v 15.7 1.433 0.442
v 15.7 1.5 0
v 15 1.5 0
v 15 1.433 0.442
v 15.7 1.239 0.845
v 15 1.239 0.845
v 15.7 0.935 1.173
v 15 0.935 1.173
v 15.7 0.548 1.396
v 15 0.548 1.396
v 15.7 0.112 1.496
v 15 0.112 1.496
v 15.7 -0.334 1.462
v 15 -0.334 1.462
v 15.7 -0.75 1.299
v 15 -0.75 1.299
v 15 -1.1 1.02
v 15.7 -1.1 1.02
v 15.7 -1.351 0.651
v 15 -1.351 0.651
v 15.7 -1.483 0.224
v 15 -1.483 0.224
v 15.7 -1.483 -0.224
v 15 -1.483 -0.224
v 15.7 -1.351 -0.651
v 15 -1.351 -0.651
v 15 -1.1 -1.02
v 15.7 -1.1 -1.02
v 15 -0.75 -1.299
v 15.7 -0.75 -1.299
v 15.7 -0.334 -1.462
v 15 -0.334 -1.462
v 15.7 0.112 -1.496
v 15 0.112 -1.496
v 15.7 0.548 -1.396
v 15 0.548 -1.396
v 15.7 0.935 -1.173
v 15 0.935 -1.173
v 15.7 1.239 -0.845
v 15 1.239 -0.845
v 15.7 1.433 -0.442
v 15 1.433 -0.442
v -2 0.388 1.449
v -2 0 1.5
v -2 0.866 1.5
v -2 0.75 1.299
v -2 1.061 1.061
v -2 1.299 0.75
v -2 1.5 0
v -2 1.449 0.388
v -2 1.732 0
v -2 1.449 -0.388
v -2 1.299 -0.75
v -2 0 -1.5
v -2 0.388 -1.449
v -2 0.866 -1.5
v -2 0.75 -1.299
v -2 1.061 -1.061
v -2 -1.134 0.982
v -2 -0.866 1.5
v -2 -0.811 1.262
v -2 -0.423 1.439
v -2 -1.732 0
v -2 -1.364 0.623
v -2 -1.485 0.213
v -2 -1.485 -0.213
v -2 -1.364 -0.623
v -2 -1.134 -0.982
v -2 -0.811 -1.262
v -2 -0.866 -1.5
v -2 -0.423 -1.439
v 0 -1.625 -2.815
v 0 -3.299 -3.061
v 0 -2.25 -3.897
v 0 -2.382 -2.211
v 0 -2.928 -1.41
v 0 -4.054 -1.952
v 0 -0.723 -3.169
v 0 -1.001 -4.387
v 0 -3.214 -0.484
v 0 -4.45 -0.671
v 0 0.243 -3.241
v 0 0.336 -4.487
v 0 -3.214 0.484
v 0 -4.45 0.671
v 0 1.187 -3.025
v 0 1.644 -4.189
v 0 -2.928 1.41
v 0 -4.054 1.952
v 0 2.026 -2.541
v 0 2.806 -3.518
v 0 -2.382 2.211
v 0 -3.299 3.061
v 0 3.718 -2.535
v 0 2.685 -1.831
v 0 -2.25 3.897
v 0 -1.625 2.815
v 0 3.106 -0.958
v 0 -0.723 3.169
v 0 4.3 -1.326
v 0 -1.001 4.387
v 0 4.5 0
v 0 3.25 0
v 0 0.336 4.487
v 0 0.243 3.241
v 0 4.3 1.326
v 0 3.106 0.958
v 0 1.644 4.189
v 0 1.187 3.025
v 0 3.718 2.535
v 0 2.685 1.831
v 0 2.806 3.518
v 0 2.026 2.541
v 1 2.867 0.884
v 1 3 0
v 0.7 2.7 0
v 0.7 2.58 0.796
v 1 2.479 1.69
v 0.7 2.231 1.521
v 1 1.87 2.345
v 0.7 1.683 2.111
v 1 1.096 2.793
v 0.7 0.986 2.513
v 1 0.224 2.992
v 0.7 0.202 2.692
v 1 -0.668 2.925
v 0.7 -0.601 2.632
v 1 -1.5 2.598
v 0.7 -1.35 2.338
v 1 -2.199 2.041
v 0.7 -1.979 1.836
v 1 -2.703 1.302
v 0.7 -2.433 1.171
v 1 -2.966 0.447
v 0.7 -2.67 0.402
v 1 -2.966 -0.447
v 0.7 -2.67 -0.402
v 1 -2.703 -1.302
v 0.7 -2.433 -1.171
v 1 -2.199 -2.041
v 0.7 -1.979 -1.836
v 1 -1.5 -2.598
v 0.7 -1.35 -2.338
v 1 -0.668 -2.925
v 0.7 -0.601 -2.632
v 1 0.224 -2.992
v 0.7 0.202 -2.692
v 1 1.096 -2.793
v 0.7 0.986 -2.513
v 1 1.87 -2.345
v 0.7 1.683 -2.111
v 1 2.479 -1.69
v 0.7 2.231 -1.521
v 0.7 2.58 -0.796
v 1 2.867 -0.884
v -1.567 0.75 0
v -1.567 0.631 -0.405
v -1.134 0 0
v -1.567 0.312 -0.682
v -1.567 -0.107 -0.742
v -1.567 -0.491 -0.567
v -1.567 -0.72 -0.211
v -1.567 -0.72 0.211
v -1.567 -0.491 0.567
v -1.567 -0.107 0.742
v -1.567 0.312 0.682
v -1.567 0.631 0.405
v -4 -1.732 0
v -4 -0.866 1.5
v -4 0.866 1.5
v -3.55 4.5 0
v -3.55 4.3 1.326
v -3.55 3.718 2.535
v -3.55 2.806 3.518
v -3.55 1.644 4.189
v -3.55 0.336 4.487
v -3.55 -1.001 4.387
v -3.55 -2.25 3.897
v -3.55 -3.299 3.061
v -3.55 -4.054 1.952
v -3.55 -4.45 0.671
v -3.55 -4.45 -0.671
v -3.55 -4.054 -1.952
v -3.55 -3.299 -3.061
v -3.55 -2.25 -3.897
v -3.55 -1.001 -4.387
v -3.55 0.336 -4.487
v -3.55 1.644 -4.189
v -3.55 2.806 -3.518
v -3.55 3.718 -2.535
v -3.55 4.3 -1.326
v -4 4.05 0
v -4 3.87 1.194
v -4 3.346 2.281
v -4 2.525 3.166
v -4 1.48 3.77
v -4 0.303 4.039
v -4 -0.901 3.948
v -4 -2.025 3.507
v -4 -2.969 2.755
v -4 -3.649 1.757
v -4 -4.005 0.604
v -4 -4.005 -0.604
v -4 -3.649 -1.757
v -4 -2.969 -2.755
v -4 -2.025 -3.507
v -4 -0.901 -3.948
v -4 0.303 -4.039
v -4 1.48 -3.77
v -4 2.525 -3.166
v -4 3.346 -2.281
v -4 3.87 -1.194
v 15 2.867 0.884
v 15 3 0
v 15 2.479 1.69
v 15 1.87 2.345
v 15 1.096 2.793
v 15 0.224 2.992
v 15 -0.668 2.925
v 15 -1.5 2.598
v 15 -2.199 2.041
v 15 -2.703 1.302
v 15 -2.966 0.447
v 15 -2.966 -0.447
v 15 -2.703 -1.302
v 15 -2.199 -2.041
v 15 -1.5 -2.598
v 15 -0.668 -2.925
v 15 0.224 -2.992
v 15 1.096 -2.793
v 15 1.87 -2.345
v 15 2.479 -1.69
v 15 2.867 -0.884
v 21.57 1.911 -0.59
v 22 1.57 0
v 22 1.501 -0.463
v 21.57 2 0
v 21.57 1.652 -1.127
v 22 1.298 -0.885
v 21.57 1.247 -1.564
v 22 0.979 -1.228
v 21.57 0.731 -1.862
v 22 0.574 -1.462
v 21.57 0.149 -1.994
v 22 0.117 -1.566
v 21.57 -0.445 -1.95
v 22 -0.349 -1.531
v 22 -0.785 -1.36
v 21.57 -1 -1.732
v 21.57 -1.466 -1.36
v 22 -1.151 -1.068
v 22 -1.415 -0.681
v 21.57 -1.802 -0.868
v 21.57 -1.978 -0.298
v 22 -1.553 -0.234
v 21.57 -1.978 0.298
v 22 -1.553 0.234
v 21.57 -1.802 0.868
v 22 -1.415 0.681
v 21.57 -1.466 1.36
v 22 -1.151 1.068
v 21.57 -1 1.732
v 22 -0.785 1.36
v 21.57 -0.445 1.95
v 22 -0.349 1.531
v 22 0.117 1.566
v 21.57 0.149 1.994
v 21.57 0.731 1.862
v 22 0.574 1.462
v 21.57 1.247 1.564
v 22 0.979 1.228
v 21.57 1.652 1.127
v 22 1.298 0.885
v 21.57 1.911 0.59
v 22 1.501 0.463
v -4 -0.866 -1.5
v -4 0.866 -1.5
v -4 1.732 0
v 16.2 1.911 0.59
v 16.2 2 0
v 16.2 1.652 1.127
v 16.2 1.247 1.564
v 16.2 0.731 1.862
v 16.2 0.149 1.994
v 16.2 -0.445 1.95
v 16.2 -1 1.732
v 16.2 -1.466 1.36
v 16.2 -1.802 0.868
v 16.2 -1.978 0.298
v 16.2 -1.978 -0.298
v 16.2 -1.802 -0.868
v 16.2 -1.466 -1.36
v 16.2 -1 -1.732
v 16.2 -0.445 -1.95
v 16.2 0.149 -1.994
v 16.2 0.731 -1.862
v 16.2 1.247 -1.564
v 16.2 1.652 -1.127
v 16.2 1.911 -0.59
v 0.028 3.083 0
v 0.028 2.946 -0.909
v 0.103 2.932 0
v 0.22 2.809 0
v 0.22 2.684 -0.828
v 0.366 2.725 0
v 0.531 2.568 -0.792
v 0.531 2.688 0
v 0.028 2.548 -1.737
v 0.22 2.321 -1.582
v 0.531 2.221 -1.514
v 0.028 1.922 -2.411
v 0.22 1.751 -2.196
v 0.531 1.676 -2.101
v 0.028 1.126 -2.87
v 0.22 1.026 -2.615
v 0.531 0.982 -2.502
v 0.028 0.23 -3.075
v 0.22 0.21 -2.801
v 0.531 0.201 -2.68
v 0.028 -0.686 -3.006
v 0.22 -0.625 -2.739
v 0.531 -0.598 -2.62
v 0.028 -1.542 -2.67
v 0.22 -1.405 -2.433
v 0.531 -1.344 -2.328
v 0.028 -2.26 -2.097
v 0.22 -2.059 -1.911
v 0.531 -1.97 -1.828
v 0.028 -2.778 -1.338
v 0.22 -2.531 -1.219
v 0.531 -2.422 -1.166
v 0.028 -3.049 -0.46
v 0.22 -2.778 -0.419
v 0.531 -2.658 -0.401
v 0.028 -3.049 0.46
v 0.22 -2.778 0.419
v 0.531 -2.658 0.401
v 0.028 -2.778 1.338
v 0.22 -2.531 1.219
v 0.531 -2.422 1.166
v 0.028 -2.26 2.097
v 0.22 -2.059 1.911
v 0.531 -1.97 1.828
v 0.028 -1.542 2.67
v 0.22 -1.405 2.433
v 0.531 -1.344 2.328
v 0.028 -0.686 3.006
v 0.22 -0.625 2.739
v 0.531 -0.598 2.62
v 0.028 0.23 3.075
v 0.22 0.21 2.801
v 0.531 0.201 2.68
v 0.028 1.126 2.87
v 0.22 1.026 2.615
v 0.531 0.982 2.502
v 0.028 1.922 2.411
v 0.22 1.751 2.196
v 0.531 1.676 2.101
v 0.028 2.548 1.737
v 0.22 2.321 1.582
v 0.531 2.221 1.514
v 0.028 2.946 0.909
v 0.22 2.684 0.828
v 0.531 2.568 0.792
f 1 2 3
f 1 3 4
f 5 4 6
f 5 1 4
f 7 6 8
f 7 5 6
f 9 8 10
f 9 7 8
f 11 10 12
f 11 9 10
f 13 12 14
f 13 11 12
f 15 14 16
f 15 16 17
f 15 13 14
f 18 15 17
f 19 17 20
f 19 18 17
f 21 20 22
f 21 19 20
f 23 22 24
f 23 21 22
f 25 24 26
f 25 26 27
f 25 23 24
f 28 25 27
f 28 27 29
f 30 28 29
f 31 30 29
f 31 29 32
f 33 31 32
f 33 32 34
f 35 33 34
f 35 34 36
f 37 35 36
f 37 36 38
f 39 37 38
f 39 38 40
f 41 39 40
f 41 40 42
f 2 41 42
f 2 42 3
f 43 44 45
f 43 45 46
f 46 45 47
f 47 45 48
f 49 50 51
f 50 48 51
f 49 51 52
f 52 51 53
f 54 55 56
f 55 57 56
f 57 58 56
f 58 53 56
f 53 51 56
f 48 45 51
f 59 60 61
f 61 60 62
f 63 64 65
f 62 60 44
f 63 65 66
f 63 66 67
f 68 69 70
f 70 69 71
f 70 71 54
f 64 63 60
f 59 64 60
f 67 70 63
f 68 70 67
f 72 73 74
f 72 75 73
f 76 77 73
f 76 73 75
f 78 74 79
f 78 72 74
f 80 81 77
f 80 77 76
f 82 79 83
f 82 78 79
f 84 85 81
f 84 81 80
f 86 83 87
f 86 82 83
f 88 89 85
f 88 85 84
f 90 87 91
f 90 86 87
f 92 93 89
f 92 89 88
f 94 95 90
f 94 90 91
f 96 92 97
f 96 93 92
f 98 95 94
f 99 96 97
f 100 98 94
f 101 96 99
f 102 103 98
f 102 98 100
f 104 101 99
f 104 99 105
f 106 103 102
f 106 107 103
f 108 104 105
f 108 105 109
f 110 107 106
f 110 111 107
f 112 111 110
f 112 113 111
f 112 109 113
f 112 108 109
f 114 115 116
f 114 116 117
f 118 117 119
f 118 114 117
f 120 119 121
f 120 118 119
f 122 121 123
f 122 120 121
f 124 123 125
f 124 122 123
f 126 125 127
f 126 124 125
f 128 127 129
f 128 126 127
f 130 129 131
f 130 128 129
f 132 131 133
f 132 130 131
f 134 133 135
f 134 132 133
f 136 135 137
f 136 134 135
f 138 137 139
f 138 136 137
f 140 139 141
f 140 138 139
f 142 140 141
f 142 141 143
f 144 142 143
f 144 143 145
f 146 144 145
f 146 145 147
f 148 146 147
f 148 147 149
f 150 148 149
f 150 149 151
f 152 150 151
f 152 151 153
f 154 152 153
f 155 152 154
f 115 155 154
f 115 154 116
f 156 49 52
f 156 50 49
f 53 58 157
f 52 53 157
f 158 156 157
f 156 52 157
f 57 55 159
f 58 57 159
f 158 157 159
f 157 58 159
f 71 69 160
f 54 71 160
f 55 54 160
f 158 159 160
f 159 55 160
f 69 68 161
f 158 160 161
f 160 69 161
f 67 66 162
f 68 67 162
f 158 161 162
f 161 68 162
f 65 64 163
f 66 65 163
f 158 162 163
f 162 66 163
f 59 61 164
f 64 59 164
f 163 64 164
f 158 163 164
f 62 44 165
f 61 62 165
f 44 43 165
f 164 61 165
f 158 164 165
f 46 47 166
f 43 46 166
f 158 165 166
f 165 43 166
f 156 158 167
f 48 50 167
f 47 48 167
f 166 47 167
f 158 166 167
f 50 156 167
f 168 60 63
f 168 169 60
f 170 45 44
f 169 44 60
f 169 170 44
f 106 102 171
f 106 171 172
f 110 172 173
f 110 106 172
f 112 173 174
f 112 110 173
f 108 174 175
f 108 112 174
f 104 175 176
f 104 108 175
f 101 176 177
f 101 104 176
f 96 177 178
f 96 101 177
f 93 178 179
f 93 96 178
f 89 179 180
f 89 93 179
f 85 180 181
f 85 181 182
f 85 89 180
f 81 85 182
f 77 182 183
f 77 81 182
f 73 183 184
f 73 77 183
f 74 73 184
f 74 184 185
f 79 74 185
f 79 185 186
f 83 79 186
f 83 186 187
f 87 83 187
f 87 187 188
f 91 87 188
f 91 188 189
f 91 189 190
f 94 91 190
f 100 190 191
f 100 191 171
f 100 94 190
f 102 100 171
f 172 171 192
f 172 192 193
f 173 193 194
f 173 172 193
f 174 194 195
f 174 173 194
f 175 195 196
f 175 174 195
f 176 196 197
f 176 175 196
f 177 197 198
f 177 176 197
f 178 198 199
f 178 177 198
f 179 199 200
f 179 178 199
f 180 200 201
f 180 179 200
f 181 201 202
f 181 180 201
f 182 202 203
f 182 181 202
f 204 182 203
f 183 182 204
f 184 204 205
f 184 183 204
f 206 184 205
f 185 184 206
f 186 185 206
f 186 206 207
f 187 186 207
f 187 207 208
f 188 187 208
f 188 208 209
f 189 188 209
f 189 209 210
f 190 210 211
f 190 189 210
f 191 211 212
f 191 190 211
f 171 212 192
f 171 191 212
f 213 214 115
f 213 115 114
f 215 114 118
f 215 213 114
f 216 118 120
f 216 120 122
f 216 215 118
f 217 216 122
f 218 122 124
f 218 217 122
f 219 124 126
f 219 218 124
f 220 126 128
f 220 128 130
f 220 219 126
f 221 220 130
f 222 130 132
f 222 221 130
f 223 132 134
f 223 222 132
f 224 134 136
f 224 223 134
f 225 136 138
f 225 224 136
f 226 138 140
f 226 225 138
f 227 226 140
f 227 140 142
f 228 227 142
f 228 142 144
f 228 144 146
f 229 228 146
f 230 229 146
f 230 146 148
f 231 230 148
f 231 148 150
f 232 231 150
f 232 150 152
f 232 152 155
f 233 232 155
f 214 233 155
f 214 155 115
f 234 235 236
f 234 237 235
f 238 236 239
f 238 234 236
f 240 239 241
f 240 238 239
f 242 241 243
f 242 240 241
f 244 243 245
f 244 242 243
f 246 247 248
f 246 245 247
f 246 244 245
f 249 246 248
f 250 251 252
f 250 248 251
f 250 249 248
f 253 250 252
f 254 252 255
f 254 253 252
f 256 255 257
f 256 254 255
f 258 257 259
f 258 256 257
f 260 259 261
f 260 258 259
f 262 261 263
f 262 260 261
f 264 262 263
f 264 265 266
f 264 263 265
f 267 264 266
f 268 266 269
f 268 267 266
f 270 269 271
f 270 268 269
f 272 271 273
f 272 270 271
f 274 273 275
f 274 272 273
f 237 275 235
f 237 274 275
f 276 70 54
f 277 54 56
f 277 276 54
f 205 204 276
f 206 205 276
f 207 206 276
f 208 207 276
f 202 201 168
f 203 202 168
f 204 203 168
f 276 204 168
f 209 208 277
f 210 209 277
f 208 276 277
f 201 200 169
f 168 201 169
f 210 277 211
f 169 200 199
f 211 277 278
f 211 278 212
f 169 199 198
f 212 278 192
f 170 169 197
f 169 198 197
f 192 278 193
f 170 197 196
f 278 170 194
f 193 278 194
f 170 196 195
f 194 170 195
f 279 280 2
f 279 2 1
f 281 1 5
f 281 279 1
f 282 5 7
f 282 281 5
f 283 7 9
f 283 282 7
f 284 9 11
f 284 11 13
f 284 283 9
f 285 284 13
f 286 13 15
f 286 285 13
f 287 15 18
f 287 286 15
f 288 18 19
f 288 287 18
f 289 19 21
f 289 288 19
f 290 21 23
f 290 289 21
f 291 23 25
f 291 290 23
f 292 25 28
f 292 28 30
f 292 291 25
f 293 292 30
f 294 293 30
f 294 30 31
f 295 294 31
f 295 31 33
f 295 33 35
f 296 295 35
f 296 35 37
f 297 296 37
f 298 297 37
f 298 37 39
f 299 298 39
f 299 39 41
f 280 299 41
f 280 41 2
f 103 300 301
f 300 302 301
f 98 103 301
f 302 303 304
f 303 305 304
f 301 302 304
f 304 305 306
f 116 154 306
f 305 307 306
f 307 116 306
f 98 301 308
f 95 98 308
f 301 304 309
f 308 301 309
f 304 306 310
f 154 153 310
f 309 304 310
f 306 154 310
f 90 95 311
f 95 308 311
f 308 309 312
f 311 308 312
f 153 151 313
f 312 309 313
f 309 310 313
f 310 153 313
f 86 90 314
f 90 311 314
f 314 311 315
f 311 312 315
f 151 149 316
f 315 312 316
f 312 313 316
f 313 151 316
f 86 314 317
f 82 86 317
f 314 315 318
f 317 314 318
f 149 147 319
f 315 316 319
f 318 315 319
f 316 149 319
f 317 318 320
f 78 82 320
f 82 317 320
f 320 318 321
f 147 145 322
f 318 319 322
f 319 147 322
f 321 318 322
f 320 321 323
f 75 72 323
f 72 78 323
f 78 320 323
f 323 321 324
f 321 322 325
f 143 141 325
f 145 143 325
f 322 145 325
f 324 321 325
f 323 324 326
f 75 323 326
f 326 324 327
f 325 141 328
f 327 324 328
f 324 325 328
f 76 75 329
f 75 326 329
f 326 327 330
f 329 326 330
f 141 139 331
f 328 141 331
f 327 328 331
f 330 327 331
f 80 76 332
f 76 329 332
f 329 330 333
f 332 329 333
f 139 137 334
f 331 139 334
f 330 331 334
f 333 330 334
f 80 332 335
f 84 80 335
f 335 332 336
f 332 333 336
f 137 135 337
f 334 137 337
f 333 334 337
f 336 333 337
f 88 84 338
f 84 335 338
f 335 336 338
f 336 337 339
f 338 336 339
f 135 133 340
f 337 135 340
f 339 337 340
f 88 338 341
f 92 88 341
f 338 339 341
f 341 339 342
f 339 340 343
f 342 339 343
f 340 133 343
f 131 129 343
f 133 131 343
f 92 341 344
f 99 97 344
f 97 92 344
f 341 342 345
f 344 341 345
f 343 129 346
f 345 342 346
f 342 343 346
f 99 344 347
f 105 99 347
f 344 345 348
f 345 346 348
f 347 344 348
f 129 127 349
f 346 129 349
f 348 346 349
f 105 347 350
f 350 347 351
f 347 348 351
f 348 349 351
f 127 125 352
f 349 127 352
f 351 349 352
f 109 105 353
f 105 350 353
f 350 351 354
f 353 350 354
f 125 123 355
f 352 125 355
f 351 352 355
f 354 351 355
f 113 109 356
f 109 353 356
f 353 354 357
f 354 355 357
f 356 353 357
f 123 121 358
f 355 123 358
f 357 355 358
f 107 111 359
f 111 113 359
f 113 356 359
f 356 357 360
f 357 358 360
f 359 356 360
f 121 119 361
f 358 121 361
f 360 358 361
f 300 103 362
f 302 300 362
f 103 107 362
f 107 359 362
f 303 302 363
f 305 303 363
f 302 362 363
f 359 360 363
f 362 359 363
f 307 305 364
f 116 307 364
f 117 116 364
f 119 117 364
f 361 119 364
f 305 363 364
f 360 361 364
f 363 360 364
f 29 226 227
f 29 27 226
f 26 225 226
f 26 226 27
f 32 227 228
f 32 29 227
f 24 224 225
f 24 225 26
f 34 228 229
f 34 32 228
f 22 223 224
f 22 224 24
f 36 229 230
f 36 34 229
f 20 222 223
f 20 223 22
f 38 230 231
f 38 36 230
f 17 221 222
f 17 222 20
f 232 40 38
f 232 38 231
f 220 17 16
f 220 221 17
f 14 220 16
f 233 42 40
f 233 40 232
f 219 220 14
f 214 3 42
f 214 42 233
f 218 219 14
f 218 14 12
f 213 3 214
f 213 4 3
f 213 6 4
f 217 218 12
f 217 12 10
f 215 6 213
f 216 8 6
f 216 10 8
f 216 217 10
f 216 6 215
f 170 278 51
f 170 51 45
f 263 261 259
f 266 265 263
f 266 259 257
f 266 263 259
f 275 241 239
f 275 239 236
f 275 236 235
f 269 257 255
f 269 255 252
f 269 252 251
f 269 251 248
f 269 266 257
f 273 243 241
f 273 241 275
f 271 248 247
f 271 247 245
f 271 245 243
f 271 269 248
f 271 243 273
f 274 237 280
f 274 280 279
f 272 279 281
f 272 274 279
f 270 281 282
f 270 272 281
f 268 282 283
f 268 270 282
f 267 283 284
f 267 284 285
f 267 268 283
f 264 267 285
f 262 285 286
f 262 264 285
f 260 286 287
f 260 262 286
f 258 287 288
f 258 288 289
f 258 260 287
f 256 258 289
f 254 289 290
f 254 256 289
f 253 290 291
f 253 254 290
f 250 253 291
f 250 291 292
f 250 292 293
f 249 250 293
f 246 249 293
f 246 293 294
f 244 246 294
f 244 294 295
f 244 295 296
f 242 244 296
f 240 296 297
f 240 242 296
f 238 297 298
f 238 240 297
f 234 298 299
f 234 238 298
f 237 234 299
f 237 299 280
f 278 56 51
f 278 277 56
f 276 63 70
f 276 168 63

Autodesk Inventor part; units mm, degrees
ref_plane "YZ Plane" through (0, 0, 0) normal (1, 0, 0) x (0, 1, 0)
ref_plane "XZ Plane" through (0, 0, 0) normal (0, 1, 0) x (-1, 0, 0)
ref_plane "XY Plane" through (0, 0, 0) normal (0, 0, 1) x (1, 0, 0)
sketch "Sketch_7" plane through (0, 0, 0) normal (0, 0, 1) x (1, 0, 0)
  line L0 (22, 0) -> (-1.134, 0)
  line L1 (-1.134, 0) -> (-2, 1.5)
  line L2 (-2, 1.5) -> (-4, 1.5)
  line L3 (-4, 1.5) -> (-4, 4.05)
  line L4 (-4, 4.05) -> (-3.55, 4.5)
  line L5 (-3.55, 4.5) -> (0, 4.5)
  line L6 (0, 4.5) -> (0, 3.25)
  arc A0 (0, 3.25) -> (0.7, 2.7) centre (0.5749, 3.2612) ccw
  line L7 (0.7, 2.7) -> (1, 3)
  line L8 (1, 3) -> (15, 3)
  line L9 (15, 3) -> (15, 1.5)
  line L10 (15, 1.5) -> (15.7, 1.5)
  line L11 (15.7, 1.5) -> (16.2, 2)
  line L12 (16.2, 2) -> (21.5705, 2)
  line L13 (21.5705, 2) -> (22, 1.5705)
  line L14 (22, 1.5705) -> (22, 0)
  line L15 (22, 0) -> (-1.134, 0)
revolve "Revolution1" add sketch "Sketch_7" angle 360 about axis through (22, 0, 0) along (1, 0, 0)
thread "Thread1" size "M4x0.7" class "6g" standard "ISO Metric profile" full length
sketch "Sketch_4" plane through (-4, 0, 0) normal (1, 0, 0) x (0, 0, -1)
  line L0 (-1.5, -0.866) -> (0, -1.7321)
  line L1 (0, -1.7321) -> (1.5, -0.866)
  line L2 (1.5, -0.866) -> (1.5, 0.866)
  line L3 (1.5, 0.866) -> (0, 1.7321)
  line L4 (0, 1.7321) -> (-1.5, 0.866)
  line L5 (-1.5, 0.866) -> (-1.5, -0.866)
extrude "Extrusion1" cut sketch "Sketch_4" along normal blind 2
properties part number "MSB6-15" material "鋼、炭素鋼"
